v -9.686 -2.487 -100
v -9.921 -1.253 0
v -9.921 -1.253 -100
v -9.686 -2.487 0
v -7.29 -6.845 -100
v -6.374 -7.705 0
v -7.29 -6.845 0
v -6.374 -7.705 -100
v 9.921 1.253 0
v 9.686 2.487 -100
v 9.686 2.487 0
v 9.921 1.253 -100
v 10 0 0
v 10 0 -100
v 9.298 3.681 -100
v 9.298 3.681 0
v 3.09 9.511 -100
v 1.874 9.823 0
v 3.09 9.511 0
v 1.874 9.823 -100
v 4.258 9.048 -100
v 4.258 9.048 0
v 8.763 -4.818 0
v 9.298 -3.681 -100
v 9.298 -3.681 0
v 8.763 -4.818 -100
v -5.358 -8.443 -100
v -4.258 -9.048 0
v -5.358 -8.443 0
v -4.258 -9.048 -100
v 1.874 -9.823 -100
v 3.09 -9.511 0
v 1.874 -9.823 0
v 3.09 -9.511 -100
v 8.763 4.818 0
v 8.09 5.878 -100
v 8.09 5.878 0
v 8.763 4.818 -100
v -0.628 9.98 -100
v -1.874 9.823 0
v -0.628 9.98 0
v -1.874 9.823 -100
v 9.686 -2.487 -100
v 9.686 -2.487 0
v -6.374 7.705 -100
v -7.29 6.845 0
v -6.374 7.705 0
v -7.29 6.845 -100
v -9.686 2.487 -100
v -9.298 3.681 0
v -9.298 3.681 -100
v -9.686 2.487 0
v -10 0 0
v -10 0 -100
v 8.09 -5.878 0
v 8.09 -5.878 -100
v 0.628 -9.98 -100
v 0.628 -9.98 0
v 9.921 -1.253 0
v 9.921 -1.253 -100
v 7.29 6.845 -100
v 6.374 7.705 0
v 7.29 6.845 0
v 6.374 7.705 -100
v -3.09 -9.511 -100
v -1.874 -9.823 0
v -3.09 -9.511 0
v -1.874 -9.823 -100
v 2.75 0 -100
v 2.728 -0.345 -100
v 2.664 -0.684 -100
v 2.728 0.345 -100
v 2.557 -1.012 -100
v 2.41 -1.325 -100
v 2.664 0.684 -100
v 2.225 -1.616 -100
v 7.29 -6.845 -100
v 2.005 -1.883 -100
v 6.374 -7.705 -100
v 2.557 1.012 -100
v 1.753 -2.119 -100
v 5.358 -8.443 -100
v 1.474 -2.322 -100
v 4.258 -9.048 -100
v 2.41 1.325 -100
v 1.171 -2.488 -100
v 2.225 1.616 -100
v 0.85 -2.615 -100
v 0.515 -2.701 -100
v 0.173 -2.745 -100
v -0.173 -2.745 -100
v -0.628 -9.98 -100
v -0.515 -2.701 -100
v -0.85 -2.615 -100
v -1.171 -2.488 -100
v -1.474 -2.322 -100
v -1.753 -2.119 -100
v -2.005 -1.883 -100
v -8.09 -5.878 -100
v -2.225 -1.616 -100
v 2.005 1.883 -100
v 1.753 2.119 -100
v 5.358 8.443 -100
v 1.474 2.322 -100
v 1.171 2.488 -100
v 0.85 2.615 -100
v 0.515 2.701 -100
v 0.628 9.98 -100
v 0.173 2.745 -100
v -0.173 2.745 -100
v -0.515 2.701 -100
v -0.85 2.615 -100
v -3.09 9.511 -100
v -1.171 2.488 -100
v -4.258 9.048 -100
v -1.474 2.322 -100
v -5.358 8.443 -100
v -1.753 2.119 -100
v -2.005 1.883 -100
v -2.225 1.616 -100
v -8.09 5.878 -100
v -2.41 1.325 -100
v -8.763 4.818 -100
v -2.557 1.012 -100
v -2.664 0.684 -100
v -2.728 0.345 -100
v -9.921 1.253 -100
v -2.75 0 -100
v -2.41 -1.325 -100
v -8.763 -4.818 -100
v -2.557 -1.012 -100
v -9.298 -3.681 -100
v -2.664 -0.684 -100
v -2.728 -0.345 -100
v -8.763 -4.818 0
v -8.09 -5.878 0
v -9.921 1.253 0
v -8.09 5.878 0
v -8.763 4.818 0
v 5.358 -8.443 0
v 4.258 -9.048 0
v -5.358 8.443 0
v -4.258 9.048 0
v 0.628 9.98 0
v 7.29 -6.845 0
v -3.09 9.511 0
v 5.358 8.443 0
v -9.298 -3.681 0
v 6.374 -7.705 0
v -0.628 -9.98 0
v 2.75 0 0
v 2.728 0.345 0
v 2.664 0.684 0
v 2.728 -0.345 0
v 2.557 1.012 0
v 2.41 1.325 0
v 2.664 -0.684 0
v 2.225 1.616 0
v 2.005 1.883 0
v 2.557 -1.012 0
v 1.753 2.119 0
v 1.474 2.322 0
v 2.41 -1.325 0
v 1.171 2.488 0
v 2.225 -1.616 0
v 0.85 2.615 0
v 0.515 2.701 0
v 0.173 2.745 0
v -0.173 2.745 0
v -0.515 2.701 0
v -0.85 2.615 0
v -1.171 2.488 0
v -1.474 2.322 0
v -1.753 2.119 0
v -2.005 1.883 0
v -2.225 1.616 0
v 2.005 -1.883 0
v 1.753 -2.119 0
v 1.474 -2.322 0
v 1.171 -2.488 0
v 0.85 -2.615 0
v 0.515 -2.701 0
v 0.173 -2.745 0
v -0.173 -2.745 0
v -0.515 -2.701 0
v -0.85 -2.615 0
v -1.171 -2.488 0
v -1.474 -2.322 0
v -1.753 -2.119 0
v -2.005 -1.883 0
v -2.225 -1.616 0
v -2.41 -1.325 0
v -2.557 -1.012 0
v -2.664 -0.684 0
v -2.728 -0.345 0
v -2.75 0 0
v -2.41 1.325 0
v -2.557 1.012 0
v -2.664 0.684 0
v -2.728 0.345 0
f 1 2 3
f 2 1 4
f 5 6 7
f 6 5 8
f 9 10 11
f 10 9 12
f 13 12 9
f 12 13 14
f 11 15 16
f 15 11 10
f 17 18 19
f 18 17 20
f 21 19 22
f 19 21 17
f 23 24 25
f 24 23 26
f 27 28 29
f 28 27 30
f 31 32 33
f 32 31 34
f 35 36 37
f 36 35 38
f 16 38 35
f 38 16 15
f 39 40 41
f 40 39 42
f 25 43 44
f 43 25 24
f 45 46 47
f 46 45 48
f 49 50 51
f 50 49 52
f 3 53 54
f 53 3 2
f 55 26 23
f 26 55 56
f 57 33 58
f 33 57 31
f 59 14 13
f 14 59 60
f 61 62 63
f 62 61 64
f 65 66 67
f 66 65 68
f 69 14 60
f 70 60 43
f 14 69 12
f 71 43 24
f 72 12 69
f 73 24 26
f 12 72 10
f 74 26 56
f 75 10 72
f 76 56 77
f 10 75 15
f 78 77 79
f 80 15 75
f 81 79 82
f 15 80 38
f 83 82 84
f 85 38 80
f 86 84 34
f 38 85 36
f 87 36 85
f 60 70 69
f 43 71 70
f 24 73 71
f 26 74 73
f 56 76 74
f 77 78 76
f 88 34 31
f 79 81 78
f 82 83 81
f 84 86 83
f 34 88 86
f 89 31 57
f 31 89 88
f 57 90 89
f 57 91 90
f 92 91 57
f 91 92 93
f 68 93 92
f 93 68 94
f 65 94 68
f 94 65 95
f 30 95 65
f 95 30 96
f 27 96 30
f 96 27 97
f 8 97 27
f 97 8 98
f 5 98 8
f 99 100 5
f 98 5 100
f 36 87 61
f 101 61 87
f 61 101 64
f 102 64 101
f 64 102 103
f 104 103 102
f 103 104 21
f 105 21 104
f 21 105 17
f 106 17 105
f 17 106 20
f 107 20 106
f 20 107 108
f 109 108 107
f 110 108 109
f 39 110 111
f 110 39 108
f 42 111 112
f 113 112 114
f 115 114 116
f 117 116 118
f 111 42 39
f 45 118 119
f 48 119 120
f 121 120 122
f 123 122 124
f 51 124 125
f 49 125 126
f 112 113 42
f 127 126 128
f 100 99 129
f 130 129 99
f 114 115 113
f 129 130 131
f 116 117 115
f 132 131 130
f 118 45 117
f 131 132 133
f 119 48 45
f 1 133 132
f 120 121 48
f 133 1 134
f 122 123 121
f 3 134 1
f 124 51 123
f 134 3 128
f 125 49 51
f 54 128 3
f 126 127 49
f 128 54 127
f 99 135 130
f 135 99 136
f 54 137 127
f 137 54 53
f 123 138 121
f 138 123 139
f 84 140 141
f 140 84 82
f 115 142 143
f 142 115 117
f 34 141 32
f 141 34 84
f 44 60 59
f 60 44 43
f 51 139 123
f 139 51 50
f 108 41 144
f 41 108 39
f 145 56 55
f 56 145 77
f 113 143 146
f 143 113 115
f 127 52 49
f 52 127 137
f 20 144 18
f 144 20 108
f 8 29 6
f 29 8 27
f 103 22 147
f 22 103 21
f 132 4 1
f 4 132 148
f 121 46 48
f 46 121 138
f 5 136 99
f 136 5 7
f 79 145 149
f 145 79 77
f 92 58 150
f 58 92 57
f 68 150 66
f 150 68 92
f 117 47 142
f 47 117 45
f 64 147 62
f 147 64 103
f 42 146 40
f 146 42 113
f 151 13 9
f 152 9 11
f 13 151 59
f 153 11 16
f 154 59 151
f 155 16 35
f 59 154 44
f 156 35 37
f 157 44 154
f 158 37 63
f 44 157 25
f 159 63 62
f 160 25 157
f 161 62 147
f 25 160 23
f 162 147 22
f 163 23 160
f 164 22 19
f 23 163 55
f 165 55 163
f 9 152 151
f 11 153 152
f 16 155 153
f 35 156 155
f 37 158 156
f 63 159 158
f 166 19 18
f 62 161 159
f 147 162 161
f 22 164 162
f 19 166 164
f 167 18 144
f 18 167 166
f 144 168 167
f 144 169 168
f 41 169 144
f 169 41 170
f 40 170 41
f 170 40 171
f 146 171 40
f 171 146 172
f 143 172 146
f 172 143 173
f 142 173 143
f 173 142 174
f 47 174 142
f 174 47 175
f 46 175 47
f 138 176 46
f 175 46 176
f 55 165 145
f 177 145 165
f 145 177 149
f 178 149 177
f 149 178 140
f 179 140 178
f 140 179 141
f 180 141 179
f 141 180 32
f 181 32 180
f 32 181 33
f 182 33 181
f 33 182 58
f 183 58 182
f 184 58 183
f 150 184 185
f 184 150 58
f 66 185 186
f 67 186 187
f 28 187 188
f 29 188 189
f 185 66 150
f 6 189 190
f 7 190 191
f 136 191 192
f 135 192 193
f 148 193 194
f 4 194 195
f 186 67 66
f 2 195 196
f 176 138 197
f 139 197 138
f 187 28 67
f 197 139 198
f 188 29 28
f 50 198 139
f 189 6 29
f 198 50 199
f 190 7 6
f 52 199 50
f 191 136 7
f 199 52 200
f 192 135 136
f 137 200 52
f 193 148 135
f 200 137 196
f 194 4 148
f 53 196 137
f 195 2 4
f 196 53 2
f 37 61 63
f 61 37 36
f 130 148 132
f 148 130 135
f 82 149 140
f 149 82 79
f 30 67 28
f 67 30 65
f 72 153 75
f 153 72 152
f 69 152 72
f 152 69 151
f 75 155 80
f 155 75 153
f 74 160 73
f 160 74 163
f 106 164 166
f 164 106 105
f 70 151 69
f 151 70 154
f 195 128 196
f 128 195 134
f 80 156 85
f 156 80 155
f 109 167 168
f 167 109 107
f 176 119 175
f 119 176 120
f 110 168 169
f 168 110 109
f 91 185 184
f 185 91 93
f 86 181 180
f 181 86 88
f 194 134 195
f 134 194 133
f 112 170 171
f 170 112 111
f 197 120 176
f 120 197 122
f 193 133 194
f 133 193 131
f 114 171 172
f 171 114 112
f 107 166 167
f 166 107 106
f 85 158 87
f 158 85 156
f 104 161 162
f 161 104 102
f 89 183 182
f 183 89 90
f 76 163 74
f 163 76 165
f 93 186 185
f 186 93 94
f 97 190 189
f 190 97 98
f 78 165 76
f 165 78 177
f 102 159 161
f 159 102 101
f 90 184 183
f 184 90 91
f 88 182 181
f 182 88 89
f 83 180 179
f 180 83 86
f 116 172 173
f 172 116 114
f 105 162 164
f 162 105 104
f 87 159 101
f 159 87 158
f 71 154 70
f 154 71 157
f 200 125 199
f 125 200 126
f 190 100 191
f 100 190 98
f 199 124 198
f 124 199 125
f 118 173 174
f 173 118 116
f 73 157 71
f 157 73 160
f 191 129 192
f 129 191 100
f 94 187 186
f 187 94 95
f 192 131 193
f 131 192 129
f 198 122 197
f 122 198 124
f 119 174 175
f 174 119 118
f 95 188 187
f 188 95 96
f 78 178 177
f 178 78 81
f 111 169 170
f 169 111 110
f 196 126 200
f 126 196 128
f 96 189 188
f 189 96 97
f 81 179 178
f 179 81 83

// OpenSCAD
$fn = 50;


difference() {
	union() {
		translate(v = [0, 0, -100.0000000000]) {
			cylinder(h = 100, r = 10.0000000000);
		}
		cylinder(h = 0, r = 16.0000000000);
	}
	union() {
		#translate(v = [0, 0, -100]) {
			cylinder(h = 100, r = 2.7500000000);
		}
	}
}
